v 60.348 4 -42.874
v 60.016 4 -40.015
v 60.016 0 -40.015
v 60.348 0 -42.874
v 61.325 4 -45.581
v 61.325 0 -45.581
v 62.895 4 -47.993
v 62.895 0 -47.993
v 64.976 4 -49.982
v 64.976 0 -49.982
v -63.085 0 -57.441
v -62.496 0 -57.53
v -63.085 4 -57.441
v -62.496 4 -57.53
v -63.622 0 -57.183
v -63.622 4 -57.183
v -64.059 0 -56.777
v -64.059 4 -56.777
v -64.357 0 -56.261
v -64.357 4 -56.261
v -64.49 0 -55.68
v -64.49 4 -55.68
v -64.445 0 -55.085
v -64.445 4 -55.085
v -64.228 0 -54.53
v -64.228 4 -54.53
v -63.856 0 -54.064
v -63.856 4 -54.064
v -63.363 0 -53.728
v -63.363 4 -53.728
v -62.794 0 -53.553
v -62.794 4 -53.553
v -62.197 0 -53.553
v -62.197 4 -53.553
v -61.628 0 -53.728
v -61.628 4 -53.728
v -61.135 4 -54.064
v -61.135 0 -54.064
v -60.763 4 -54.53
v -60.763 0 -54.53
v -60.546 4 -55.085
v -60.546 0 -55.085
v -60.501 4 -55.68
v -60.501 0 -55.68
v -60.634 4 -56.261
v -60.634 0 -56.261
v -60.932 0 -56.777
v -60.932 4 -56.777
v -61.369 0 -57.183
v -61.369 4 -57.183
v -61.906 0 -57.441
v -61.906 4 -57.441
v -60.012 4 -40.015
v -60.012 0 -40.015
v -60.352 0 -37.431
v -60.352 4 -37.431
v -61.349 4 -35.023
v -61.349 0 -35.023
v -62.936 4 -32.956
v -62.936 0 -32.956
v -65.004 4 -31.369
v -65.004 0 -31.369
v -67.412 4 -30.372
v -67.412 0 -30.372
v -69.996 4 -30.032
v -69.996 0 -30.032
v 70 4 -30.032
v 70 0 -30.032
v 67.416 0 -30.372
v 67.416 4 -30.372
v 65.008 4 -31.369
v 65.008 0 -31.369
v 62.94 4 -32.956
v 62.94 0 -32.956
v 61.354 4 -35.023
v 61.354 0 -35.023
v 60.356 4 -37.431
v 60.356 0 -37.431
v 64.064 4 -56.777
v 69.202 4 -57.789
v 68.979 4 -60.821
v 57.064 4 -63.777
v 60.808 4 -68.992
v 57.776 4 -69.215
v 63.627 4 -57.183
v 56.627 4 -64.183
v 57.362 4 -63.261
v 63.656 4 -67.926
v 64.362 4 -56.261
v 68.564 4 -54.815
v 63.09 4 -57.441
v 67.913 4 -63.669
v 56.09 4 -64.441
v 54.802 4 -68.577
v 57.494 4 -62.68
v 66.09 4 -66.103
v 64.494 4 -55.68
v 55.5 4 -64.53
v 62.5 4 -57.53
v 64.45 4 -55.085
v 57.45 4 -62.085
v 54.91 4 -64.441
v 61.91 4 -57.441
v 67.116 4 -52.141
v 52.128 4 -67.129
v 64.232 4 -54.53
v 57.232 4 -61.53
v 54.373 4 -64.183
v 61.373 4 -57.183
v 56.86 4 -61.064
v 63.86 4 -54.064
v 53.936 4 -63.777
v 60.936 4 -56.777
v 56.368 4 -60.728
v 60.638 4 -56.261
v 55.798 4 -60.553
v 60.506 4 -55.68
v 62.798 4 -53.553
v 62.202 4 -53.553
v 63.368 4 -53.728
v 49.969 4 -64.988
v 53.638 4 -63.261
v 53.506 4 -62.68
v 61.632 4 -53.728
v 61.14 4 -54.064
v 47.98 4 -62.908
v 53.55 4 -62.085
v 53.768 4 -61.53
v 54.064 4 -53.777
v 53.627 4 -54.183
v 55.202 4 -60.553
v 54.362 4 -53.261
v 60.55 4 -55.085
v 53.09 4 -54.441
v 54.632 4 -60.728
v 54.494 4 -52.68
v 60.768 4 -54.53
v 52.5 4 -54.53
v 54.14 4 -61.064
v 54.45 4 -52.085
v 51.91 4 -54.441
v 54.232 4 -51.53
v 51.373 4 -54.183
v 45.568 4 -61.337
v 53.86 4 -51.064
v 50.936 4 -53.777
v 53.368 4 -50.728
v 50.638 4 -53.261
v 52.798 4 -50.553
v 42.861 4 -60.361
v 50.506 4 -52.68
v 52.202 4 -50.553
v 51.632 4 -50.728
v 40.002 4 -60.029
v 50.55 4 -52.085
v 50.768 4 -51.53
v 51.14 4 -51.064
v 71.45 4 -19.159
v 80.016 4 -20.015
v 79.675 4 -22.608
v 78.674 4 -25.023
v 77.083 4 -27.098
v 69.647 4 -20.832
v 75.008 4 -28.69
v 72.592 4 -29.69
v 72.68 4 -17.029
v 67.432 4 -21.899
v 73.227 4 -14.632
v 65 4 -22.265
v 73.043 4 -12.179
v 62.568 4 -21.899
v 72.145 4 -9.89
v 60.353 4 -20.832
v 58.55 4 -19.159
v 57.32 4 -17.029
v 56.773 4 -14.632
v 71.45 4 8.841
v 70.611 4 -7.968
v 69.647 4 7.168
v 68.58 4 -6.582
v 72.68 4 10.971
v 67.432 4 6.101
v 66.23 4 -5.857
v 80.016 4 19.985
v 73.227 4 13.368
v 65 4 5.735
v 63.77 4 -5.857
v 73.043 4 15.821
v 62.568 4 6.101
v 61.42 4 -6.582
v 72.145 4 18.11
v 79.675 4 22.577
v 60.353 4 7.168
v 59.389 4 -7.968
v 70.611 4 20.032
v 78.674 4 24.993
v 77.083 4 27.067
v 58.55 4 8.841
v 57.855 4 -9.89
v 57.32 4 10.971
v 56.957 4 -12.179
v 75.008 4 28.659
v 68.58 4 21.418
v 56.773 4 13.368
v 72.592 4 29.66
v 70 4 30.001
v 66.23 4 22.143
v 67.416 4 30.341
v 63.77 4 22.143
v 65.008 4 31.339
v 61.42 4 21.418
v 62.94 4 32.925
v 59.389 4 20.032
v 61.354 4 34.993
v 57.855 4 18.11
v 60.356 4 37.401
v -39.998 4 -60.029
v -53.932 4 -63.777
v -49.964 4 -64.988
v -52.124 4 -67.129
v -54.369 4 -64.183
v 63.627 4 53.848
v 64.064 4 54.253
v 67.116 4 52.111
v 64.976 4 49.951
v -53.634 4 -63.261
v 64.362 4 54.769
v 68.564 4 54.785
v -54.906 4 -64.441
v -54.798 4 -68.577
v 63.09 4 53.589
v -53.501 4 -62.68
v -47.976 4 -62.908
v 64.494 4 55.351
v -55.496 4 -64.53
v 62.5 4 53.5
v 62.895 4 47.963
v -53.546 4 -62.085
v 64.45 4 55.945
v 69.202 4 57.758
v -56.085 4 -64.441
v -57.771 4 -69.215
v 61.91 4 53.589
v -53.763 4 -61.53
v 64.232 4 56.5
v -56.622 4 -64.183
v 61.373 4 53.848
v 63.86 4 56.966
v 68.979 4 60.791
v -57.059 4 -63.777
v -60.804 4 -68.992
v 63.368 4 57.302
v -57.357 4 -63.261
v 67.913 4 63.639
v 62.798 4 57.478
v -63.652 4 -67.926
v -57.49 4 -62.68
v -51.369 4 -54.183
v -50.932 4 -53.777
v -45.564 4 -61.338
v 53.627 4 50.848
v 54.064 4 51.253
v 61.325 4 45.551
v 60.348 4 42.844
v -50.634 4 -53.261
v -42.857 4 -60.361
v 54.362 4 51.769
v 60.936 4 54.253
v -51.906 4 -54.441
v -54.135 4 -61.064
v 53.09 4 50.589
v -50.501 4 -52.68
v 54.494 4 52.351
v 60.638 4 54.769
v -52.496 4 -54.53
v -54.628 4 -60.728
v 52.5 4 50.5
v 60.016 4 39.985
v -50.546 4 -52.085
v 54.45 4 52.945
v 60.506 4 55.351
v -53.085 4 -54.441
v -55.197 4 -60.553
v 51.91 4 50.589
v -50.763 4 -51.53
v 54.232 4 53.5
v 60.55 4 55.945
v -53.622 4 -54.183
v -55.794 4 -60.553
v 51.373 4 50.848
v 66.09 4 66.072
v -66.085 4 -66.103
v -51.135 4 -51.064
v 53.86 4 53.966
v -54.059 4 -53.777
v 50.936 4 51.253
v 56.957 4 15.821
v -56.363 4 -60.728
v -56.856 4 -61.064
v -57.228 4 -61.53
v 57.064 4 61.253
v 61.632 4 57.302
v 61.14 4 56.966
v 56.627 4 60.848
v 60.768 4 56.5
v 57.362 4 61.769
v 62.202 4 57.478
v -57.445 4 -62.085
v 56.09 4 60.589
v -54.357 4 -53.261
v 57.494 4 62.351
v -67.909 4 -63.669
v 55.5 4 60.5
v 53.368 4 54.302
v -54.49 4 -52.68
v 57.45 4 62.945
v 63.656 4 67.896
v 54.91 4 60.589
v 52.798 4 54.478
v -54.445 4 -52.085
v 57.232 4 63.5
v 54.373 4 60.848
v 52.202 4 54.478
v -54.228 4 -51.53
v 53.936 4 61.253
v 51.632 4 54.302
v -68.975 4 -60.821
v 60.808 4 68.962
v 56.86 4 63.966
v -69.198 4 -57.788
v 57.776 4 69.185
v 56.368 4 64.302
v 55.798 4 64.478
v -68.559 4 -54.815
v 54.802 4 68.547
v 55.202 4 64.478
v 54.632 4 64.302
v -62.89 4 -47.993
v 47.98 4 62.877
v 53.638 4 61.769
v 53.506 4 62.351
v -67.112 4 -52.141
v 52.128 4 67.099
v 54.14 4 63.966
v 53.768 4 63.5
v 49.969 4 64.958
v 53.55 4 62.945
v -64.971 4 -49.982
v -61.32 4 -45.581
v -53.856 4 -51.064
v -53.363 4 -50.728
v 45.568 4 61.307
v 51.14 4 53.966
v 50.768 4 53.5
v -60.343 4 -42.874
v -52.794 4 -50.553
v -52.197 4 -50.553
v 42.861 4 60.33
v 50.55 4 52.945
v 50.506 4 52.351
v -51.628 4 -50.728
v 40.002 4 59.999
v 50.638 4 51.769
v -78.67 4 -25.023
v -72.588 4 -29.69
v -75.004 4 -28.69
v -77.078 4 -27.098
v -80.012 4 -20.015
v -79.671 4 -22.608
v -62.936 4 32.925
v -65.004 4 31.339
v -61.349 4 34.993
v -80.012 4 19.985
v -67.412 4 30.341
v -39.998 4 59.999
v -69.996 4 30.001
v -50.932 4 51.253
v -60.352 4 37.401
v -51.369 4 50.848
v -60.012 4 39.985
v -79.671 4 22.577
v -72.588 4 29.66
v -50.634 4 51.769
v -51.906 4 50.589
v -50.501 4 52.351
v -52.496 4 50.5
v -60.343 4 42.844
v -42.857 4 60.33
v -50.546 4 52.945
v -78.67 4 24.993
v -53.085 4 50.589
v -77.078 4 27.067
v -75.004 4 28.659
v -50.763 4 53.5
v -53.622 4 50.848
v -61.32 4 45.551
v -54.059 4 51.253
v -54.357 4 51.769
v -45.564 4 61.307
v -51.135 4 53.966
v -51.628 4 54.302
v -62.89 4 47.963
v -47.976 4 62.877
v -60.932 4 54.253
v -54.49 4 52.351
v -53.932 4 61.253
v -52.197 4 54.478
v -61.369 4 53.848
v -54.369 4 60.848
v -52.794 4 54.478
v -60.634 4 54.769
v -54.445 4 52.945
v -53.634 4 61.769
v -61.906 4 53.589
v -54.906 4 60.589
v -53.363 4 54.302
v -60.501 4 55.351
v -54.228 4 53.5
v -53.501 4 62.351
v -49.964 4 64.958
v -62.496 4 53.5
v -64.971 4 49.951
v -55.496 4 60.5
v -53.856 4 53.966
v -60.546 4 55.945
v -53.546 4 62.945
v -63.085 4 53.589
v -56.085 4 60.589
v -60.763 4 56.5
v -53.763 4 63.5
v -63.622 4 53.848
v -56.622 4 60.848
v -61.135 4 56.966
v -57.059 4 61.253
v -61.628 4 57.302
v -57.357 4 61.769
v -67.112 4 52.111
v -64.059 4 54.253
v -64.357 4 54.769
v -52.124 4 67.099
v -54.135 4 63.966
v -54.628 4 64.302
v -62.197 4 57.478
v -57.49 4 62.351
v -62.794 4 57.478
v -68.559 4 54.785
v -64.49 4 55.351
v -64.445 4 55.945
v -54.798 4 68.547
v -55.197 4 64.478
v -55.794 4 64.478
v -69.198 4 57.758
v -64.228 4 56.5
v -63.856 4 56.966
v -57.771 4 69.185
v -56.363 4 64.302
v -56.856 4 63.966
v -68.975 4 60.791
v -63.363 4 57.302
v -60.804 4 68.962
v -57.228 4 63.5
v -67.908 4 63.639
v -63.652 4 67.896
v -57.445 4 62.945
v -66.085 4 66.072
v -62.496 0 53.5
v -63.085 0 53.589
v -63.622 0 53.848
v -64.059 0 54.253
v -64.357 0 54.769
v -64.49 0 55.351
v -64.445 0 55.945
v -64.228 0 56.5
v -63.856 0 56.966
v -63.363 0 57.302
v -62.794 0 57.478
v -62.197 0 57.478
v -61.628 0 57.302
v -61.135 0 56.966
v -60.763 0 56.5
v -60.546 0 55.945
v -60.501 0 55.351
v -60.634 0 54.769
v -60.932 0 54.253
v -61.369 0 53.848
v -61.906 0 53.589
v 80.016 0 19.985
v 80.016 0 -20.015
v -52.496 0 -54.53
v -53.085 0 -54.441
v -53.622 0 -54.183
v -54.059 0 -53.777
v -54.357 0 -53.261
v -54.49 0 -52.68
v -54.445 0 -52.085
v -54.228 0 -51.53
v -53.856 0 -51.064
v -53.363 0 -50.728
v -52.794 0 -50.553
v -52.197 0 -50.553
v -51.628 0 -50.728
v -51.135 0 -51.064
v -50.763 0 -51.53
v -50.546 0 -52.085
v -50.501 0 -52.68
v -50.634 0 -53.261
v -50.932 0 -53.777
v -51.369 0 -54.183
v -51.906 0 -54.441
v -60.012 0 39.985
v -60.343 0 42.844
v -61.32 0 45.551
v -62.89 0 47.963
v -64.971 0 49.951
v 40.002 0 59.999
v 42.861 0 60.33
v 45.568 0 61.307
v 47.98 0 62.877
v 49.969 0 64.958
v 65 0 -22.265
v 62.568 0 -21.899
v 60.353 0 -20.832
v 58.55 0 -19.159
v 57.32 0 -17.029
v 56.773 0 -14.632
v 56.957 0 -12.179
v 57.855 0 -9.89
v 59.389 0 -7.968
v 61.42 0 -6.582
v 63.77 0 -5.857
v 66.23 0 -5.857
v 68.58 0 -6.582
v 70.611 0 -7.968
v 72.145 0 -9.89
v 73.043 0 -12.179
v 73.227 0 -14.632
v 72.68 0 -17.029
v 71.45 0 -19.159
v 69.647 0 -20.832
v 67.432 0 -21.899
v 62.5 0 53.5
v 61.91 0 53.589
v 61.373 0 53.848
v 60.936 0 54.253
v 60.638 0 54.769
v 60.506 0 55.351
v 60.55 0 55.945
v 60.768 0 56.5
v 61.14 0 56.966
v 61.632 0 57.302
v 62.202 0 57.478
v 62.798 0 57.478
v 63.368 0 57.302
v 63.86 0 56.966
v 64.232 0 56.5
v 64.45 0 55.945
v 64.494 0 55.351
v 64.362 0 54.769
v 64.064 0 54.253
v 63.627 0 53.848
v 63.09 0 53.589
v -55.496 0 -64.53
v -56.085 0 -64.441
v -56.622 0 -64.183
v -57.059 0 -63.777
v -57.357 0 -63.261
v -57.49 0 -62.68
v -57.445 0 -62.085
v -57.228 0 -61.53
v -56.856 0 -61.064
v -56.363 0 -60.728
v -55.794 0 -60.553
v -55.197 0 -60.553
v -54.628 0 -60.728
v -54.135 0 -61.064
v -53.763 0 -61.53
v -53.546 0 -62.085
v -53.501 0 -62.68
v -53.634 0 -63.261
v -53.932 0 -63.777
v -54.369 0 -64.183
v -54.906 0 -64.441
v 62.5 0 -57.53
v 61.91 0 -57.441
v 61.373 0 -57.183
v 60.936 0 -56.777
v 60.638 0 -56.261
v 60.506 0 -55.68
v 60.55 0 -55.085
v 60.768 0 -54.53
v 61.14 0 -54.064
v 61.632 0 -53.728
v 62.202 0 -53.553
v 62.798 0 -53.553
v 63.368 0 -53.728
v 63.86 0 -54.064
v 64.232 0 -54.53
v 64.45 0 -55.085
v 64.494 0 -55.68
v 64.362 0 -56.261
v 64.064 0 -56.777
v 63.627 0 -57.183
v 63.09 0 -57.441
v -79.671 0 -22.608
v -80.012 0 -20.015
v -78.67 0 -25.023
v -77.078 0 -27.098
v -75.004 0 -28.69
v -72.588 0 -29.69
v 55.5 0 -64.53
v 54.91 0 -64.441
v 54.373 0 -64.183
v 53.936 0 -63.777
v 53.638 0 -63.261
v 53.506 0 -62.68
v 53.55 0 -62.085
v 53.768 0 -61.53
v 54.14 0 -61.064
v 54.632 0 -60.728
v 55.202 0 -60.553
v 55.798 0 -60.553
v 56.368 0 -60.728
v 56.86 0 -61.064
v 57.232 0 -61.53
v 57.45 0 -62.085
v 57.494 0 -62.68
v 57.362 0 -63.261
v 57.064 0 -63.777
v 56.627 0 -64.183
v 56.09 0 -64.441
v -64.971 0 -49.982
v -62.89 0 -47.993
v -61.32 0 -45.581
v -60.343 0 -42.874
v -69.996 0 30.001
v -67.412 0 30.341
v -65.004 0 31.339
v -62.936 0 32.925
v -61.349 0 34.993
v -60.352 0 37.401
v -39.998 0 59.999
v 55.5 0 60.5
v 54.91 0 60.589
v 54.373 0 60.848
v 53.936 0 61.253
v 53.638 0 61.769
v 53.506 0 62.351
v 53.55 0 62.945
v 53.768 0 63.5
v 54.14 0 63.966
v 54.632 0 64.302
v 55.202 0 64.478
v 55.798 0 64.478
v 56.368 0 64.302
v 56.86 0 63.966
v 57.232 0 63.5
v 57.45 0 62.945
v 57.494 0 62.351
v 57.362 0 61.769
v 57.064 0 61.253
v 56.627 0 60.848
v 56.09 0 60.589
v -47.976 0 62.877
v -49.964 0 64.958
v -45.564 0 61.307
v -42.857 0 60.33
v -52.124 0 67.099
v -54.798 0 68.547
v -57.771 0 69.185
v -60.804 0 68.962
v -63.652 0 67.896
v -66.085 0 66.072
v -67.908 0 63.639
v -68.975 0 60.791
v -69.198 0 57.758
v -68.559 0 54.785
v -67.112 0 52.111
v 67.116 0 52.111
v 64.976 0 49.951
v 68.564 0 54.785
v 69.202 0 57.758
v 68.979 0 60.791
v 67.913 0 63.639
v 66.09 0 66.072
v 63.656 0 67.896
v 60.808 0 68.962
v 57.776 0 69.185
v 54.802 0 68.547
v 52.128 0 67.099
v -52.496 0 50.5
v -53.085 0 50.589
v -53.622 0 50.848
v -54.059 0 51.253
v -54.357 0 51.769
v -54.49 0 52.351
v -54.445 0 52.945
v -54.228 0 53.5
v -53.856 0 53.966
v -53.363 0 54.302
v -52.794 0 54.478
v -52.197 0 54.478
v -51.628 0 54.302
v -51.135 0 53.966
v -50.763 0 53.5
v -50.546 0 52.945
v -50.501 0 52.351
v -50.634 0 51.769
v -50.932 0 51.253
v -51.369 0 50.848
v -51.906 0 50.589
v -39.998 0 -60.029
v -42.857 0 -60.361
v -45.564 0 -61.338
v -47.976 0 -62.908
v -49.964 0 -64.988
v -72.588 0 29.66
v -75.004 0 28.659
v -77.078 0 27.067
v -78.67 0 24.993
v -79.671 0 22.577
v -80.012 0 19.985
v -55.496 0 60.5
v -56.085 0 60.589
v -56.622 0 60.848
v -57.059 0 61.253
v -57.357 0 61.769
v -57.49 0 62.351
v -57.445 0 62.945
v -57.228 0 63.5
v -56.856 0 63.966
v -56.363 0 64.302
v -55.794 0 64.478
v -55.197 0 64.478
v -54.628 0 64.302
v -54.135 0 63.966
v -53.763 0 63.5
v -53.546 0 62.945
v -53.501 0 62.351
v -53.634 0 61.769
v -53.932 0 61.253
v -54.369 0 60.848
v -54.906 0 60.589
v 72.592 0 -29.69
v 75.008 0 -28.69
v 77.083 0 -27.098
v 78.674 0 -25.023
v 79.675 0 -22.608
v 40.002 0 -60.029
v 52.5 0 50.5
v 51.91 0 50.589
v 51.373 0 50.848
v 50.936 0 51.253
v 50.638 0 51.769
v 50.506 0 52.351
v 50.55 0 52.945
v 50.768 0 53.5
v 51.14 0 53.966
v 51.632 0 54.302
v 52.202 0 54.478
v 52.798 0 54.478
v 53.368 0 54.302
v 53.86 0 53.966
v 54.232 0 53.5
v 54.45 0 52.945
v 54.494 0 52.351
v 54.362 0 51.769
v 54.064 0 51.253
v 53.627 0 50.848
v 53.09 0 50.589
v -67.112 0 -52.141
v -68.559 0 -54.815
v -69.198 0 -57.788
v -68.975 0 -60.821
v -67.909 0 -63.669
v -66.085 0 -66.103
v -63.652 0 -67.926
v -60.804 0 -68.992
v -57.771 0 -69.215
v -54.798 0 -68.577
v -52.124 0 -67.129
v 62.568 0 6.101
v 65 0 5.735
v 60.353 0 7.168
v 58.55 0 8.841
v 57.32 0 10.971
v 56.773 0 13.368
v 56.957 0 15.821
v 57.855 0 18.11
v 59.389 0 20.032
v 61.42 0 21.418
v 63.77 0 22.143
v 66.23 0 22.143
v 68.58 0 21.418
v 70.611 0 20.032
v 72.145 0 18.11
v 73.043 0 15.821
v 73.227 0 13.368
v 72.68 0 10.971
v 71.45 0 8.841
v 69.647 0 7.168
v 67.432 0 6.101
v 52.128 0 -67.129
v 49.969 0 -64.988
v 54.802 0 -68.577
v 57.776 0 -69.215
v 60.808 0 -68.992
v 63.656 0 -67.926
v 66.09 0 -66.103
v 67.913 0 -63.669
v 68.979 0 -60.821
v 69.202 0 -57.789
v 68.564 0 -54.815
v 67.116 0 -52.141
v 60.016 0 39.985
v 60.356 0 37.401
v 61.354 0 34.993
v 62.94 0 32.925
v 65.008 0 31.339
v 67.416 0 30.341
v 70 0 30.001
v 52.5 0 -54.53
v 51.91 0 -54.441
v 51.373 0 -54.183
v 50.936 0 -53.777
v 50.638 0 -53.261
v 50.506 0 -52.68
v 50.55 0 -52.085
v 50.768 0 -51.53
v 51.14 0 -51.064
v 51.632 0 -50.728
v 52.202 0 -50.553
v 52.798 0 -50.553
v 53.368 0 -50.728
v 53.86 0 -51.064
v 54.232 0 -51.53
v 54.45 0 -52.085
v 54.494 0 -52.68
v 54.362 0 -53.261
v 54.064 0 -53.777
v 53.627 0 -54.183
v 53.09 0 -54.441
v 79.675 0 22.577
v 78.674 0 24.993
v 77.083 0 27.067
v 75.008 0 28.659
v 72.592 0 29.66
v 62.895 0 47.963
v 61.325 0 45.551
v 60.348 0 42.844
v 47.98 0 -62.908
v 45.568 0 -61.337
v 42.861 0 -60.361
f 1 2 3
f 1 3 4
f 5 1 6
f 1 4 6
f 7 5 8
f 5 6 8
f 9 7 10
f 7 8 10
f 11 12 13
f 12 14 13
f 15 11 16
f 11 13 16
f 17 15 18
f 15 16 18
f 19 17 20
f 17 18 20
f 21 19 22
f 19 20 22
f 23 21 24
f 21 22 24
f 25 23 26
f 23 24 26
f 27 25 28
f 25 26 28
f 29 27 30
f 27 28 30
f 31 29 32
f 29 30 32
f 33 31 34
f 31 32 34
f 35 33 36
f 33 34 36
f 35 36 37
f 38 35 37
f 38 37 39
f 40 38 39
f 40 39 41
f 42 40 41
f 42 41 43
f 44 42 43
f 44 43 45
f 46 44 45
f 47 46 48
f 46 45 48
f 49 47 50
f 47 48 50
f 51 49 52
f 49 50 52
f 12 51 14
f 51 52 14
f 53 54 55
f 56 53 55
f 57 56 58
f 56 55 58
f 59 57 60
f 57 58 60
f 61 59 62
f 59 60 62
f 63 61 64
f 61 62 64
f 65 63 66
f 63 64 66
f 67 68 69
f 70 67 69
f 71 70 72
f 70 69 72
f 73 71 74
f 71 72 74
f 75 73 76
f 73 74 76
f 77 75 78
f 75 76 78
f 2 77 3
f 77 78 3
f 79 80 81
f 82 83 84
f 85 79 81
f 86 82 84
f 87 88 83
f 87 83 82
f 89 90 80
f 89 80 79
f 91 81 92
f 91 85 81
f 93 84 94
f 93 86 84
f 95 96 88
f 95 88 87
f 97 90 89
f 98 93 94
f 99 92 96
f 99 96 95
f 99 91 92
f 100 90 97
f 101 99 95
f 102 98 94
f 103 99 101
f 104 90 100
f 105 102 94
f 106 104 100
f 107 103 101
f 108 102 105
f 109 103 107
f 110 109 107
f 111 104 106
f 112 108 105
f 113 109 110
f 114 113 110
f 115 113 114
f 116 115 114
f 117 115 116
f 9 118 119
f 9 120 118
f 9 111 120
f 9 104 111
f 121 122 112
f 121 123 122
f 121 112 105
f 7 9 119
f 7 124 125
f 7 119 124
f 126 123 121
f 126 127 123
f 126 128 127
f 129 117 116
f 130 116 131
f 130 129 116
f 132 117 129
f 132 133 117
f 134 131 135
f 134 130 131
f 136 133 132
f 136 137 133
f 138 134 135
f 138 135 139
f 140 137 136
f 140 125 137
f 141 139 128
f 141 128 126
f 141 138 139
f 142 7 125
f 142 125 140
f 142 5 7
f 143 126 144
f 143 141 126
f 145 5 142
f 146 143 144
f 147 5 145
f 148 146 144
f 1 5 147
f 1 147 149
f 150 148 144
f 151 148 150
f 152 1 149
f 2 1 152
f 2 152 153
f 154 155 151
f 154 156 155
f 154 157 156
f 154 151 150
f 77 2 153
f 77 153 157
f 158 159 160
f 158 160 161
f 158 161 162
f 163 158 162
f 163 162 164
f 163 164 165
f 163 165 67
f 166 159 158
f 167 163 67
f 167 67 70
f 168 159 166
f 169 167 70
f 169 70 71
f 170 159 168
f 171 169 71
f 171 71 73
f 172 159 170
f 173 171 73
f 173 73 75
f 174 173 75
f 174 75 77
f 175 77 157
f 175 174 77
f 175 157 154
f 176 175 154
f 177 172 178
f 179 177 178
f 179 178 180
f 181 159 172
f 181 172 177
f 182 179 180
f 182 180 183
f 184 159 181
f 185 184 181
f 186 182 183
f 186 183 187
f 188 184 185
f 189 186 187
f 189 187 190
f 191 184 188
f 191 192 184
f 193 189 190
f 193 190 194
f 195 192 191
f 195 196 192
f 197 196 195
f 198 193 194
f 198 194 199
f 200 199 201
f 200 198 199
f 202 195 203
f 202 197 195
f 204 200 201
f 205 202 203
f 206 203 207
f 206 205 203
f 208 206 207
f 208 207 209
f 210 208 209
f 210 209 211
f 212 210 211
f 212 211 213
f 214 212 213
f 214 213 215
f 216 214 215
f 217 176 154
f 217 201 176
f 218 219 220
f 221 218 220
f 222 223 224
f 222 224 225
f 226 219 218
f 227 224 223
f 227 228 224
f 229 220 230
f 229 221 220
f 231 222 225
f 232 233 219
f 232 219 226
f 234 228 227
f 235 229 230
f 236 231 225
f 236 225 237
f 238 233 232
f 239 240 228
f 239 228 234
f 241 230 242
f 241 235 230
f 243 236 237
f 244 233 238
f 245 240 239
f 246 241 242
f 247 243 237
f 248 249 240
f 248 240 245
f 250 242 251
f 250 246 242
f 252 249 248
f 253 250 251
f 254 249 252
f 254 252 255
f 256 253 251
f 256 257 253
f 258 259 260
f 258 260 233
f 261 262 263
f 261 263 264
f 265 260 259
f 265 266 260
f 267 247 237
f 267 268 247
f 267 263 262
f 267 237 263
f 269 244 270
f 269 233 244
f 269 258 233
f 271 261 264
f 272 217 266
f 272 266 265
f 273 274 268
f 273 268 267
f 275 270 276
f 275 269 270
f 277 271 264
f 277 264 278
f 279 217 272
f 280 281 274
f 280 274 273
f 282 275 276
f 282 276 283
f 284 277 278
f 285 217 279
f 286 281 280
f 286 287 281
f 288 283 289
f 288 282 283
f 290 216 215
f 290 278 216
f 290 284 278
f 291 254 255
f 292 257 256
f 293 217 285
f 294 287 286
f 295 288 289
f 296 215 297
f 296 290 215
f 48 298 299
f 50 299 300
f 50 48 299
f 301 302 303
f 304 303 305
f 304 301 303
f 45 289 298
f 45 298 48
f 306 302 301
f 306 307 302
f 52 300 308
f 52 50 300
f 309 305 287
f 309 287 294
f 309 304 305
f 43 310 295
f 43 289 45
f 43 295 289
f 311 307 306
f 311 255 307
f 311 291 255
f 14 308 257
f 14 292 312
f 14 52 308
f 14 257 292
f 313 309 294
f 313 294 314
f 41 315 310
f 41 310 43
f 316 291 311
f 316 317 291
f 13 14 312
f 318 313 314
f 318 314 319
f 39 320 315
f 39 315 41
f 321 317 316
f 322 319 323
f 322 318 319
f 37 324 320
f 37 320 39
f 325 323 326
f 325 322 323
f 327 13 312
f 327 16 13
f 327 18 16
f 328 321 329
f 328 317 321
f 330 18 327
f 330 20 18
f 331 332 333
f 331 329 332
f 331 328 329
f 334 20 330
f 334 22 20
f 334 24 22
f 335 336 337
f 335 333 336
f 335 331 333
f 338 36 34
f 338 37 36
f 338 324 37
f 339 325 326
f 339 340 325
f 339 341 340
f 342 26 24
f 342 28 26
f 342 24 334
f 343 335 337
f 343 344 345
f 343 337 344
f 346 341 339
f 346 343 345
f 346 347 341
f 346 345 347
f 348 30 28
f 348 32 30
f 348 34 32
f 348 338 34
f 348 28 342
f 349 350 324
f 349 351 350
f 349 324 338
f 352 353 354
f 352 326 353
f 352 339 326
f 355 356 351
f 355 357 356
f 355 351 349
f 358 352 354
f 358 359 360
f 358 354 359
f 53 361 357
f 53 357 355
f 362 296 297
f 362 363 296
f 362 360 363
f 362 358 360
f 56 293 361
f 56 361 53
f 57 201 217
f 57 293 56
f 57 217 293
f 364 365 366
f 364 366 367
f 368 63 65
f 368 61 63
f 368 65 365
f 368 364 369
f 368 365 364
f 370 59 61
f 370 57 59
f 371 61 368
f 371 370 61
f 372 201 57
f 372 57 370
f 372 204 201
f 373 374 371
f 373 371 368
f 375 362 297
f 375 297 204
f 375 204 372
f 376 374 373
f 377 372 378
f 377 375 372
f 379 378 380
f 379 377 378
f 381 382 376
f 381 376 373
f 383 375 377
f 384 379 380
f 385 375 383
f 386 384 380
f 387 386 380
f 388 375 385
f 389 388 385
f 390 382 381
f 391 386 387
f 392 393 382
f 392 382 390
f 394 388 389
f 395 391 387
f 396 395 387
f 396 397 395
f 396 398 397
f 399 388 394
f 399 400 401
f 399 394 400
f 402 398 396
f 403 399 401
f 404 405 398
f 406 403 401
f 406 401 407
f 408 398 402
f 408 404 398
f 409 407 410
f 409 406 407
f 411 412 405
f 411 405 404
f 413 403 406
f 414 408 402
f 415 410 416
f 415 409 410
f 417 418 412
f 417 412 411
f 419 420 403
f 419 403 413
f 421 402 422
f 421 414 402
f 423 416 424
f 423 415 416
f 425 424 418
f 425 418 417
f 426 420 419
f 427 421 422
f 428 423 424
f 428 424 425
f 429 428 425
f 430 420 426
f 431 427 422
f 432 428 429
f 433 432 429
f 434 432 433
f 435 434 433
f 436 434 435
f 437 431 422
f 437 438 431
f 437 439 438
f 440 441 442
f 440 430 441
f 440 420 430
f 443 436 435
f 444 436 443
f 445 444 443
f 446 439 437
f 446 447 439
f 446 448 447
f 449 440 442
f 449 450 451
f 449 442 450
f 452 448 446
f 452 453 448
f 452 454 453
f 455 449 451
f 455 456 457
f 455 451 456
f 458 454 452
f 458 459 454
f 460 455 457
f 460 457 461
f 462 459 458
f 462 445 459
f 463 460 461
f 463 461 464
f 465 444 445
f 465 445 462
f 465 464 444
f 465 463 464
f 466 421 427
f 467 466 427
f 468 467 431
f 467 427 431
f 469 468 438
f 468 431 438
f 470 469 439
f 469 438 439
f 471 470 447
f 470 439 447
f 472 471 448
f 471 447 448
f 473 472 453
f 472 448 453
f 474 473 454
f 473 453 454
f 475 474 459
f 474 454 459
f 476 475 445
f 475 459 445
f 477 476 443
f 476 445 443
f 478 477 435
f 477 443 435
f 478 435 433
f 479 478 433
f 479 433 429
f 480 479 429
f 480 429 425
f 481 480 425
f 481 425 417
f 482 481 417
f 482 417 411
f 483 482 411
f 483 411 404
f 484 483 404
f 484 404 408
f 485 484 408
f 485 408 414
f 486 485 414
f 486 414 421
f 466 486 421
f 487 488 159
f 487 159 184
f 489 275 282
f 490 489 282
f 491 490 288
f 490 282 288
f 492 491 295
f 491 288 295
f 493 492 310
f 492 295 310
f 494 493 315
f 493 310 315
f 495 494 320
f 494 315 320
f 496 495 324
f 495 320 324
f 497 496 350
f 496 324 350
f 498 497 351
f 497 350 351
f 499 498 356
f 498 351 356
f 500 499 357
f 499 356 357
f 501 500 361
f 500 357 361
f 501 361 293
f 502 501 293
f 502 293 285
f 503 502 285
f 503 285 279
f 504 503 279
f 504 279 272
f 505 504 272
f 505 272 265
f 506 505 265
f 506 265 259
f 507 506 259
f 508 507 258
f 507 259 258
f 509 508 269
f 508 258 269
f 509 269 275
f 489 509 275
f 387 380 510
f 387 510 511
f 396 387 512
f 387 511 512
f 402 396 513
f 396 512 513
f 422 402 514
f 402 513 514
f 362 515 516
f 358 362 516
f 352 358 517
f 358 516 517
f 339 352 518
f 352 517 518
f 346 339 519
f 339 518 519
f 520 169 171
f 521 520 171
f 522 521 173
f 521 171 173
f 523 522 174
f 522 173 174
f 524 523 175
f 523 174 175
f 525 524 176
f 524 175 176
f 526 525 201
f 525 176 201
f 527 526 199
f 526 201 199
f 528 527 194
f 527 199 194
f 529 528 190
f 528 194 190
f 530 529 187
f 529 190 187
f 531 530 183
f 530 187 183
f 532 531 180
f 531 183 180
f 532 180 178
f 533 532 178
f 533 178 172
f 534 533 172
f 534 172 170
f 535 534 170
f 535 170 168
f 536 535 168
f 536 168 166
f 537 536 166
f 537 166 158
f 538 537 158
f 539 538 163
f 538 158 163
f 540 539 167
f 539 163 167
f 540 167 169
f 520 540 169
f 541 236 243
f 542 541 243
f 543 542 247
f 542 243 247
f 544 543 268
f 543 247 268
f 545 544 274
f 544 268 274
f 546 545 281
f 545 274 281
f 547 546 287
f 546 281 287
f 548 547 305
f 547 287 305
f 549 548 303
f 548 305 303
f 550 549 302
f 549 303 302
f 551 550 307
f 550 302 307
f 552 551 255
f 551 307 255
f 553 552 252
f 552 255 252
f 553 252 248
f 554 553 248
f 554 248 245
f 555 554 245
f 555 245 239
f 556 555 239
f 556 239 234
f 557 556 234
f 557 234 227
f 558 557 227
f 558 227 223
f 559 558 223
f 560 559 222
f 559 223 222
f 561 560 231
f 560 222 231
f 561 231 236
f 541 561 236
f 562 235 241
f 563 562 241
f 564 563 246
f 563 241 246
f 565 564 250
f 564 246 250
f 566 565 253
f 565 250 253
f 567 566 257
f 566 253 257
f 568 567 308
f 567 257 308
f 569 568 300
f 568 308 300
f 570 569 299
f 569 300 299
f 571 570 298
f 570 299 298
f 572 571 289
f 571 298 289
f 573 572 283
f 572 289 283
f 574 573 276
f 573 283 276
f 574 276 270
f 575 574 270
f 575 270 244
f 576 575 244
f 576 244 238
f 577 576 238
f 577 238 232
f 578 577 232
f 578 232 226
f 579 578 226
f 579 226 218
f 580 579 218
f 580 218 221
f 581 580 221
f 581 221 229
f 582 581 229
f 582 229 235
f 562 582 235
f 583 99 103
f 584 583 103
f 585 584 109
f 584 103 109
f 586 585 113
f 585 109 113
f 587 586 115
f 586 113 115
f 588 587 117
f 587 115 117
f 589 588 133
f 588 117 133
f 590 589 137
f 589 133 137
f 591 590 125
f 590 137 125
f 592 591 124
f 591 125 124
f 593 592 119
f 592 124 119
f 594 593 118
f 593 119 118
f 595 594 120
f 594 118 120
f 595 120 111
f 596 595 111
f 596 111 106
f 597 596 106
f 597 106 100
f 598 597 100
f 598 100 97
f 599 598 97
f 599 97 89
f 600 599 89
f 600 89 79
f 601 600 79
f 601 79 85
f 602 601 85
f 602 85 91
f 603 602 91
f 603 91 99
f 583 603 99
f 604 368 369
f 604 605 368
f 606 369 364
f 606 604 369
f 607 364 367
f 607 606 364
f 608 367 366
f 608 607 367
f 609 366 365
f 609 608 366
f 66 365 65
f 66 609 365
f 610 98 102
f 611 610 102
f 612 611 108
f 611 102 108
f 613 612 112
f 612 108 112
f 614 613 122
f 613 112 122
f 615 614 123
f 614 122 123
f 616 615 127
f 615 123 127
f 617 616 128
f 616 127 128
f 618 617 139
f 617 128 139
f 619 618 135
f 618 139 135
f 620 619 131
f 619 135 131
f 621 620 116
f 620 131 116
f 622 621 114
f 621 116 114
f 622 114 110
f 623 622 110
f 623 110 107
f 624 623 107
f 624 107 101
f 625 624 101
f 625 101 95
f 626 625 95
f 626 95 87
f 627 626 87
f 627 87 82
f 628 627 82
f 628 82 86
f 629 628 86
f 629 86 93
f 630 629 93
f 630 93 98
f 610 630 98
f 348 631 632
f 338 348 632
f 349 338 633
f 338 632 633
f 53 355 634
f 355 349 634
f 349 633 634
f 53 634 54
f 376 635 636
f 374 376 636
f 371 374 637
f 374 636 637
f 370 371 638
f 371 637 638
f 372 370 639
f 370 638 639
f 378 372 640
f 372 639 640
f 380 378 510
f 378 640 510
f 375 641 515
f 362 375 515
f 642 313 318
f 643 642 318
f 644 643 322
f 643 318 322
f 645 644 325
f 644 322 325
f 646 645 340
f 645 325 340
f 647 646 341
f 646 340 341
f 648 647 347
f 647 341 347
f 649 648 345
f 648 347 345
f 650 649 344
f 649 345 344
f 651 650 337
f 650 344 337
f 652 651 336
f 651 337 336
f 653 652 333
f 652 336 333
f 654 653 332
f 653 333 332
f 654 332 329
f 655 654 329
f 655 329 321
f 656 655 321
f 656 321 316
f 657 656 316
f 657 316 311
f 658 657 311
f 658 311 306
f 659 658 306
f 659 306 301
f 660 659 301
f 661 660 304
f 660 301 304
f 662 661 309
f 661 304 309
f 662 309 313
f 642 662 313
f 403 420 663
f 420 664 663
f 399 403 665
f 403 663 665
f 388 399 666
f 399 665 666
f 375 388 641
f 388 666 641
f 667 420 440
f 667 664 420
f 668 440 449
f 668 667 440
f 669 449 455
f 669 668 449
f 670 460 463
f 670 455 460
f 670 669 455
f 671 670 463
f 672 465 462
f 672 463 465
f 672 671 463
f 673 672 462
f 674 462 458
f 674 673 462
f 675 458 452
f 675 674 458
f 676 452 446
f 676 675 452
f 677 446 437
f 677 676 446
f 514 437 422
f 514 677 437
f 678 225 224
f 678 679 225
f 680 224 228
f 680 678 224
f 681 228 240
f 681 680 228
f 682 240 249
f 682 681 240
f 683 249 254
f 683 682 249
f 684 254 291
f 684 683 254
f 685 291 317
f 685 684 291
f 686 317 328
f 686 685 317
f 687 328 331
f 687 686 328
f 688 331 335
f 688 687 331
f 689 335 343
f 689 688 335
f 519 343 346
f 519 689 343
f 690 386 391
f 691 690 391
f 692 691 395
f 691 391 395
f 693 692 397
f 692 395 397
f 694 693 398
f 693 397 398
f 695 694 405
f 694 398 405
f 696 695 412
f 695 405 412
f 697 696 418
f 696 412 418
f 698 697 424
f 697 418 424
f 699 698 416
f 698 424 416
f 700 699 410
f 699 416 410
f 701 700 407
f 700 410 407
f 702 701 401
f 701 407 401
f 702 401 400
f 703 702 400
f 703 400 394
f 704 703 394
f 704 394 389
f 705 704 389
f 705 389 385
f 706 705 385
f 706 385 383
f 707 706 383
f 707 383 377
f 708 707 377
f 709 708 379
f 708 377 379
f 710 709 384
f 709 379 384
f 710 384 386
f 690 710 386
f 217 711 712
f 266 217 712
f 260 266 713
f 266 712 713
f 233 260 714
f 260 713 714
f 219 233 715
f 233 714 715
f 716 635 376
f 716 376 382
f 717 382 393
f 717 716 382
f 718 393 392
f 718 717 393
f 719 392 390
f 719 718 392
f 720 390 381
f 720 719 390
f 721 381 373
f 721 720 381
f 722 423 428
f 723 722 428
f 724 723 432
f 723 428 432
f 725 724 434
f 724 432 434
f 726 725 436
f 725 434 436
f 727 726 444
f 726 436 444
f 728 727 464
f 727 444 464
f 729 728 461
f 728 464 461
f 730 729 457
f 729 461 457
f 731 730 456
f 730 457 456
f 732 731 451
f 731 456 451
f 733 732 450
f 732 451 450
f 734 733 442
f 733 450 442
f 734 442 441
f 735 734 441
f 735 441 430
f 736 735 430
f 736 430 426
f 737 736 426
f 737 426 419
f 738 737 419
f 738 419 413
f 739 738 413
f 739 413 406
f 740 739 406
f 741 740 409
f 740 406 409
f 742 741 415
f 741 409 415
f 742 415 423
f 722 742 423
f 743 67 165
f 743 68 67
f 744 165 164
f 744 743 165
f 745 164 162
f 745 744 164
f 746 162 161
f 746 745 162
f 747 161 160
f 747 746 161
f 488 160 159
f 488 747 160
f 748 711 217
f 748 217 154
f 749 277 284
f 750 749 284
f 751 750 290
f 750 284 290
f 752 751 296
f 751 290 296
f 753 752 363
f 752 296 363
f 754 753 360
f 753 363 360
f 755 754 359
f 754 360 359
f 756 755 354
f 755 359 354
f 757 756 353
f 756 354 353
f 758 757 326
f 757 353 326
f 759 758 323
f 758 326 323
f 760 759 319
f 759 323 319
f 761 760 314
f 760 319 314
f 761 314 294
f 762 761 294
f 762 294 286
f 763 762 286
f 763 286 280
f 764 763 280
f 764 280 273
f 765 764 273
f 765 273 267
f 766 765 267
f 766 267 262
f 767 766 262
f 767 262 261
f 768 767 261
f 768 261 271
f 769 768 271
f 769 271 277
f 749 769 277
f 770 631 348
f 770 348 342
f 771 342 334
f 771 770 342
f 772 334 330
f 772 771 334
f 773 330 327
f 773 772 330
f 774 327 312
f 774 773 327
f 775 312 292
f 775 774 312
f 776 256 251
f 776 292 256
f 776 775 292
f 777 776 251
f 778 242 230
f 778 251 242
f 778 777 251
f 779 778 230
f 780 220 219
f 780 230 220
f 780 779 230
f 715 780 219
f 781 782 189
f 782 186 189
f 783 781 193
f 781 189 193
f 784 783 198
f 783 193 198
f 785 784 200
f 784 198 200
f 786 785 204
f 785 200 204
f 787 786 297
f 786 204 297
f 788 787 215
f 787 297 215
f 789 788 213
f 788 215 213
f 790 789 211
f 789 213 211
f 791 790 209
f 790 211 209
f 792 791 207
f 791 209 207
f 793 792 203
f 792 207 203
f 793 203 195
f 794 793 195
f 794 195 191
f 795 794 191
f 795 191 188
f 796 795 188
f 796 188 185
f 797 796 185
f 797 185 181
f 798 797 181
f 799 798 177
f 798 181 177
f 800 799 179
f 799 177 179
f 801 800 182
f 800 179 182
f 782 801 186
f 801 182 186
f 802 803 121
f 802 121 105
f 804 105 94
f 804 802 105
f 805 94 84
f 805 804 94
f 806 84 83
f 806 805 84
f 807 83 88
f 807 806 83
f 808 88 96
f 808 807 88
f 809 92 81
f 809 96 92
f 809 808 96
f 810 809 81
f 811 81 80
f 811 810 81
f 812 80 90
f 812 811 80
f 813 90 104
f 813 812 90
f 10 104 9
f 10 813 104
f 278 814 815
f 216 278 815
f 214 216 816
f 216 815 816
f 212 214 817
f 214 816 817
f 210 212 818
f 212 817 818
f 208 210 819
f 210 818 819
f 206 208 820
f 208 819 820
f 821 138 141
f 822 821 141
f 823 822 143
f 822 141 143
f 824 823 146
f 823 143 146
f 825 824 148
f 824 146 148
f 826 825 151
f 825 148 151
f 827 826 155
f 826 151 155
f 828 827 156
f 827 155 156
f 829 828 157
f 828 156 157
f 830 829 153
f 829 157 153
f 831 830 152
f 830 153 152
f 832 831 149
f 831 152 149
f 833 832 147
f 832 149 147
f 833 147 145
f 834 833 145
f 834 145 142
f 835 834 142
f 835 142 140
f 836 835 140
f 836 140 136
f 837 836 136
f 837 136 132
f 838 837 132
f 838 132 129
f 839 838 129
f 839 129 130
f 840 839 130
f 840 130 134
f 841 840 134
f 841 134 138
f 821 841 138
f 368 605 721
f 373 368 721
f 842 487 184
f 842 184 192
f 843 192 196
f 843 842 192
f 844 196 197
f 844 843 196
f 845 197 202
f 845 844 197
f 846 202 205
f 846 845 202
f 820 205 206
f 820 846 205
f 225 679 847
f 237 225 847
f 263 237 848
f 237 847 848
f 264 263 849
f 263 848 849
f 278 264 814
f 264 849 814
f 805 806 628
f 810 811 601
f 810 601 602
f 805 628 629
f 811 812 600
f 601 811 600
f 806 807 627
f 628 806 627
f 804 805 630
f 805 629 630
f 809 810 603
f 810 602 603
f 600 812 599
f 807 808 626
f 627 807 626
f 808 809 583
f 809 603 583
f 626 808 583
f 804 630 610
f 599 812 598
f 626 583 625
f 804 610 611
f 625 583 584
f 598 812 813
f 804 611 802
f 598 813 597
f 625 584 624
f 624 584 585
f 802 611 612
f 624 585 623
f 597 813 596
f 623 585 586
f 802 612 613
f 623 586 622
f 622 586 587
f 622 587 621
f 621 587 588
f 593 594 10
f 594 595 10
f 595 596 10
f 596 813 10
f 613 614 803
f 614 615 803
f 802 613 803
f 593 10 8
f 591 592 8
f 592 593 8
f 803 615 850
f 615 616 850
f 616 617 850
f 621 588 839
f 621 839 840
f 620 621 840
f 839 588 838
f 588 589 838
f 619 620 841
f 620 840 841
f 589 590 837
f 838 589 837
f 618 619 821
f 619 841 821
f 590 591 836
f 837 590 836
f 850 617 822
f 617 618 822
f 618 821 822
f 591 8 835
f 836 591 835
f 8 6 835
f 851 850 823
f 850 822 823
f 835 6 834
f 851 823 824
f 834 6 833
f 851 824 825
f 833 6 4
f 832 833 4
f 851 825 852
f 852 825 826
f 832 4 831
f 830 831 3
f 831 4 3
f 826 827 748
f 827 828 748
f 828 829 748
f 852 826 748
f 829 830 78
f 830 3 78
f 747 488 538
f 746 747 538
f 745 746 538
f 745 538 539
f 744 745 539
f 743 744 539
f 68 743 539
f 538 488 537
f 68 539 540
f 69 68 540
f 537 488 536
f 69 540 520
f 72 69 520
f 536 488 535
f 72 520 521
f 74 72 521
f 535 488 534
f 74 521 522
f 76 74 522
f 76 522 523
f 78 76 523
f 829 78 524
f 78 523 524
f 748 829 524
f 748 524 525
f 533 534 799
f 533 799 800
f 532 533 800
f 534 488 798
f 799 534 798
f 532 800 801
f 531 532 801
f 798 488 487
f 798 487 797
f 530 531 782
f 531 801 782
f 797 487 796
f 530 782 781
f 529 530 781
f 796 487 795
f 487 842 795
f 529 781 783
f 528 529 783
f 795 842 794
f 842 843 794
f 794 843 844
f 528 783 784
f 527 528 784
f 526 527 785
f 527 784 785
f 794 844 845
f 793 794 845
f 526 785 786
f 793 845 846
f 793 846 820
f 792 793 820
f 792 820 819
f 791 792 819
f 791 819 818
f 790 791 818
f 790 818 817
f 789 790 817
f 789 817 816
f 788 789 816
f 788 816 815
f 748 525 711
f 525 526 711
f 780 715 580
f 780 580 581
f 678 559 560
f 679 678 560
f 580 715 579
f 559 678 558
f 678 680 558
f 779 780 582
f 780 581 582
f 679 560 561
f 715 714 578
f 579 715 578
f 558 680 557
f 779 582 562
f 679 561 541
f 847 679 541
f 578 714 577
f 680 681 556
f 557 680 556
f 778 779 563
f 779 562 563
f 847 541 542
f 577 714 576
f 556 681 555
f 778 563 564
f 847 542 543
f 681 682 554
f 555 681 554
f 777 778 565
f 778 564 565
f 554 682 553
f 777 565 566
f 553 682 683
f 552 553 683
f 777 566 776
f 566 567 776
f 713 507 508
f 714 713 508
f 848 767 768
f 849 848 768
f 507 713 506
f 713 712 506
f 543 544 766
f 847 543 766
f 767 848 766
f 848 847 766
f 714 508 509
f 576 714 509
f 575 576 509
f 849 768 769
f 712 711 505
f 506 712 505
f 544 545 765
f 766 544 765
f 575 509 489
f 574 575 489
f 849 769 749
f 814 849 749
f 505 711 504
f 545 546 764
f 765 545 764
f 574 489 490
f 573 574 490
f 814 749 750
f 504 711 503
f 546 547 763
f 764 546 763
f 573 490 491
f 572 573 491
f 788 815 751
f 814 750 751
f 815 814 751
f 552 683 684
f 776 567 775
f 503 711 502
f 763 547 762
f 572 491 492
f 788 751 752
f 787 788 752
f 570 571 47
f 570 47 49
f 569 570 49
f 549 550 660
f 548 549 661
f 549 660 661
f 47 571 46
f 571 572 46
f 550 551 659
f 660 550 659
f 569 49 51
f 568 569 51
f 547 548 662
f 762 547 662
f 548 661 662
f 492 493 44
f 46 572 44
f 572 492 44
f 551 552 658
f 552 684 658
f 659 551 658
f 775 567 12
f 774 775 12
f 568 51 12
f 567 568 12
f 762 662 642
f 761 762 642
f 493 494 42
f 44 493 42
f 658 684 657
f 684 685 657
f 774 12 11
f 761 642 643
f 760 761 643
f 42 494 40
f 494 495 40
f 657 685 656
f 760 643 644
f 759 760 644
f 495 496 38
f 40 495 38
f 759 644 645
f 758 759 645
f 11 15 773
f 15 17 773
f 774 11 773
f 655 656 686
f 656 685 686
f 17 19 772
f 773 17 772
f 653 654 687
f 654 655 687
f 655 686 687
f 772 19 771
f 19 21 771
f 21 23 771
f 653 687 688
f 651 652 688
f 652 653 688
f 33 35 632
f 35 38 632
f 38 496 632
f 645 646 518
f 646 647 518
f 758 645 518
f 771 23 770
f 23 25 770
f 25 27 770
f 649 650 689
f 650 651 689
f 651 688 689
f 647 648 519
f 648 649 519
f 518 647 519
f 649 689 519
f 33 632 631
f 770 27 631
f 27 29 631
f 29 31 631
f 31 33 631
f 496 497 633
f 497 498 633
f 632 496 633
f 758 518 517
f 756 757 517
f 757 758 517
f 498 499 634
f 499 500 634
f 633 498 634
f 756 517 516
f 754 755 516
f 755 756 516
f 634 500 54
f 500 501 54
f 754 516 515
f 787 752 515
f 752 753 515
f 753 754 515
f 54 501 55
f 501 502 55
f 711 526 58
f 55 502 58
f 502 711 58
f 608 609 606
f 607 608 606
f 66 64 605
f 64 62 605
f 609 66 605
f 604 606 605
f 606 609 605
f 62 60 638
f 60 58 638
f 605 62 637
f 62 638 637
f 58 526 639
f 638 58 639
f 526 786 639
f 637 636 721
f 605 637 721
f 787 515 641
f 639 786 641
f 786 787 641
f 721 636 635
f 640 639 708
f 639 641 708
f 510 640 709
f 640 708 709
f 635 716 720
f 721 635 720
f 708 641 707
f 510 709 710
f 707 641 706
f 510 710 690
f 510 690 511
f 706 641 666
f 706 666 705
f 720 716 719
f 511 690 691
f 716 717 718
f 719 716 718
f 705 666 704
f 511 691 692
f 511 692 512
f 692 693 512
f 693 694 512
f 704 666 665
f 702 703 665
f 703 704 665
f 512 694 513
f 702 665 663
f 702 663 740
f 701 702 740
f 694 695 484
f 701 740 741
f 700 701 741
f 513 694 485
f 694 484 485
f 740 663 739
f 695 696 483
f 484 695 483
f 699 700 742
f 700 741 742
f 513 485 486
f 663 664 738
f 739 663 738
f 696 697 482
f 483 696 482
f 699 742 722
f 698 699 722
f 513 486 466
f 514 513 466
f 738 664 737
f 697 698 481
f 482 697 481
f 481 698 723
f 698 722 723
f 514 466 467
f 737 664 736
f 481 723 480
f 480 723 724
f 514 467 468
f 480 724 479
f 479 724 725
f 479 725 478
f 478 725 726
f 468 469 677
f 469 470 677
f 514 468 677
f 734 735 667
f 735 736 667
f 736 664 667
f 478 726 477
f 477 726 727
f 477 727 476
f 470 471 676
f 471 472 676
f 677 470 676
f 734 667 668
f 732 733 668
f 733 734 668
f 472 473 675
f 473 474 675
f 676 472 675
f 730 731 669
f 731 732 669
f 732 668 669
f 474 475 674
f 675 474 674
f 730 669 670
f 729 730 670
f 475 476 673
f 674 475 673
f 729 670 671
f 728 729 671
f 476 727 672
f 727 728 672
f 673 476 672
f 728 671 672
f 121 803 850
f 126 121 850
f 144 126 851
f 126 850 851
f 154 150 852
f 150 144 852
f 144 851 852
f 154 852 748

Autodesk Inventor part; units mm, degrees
ref_plane "YZ Plane" through (0, 0, 0) normal (1, 0, 0) x (0, 1, 0)
ref_plane "XZ Plane" through (0, 0, 0) normal (0, 1, 0) x (-1, 0, 0)
ref_plane "XY Plane" through (0, 0, 0) normal (0, 0, 1) x (1, 0, 0)
sketch "Sketch1" plane through (0, 0, 0) normal (0, 1, 0) x (-1, 0, 0)
  line L0 (-0.0023, 59.9989) -> (-40.0023, 59.9989)
  line L1 (-0.0023, 59.9989) -> (39.9977, 59.9989) construction
  line L2 (-60.0163, -0.0152) -> (-60.0163, 39.9848)
  line L3 (-60.0163, -0.0152) -> (-20.0163, -0.0152) construction
  line L4 (-60.0163, -0.0152) -> (-0.0023, -0.0152)
  line L5 (-0.0023, -0.0152) -> (-0.0023, 59.9989)
  arc A0 (-49.9687, 64.958) -> (-40.0023, 59.9989) centre (-40.0023, 72.4933) ccw
  arc A1 (-60.0163, 39.9848) -> (-64.9755, 49.9513) centre (-72.5108, 39.9848) ccw
  arc A2 (-49.9687, 64.958) -> (-64.9755, 49.9513) centre (-58.5144, 58.4969) ccw
  line L6 (-40.0023, 59.9989) -> (-40.0023, 59.4989)
  line L7 (-60.0163, 39.9848) -> (-59.5163, 39.9848)
  arc A3 (-59.5163, 39.9848) -> (-40.0023, 59.4989) centre (-59.5163, 59.4989) ccw
  line L8 (-60.0163, -0.0152) -> (-80.0163, -0.0152)
  line L9 (-80.0163, -0.0152) -> (-80.0163, 19.9848)
  arc A4 (-70, 30.0011) -> (-60.0163, 39.9848) centre (-70, 39.9848) ccw
  arc A5 (-70, 30.0011) -> (-80.0163, 19.9848) centre (-70, 19.9848) ccw
  line L10 (-60.0163, -40.0152) -> (-59.5163, -40.0152)
  arc A6 (-64.9755, -49.9816) -> (-60.0163, -40.0152) centre (-72.5108, -40.0152) ccw
  line L11 (-60.0163, -0.0152) -> (-60.0163, -40.0152)
  arc A7 (-64.9755, -49.9816) -> (-49.9687, -64.9884) centre (-58.5144, -58.5273) ccw
  arc A8 (-40.0023, -60.0292) -> (-49.9687, -64.9884) centre (-40.0023, -72.5237) ccw
  arc A9 (-40.0023, -59.5292) -> (-59.5163, -40.0152) centre (-59.5163, -59.5292) ccw
  line L12 (-40.0023, -60.0292) -> (-40.0023, -59.5292)
  line L13 (-0.0023, -60.0292) -> (-40.0023, -60.0292)
  line L14 (-0.0023, -0.0152) -> (-0.0023, -60.0292)
  arc A10 (-60.0163, -40.0152) -> (-70, -30.0315) centre (-70, -40.0152) ccw
  line L15 (-80.0163, -0.0152) -> (-80.0163, -20.0152)
  arc A11 (-80.0163, -20.0152) -> (-70, -30.0315) centre (-70, -20.0152) ccw
  arc A12 (80.0118, 19.9848) -> (69.9955, 30.0011) centre (69.9955, 19.9848) ccw
  line L16 (60.0118, -0.0152) -> (80.0118, -0.0152)
  line L17 (80.0118, -0.0152) -> (80.0118, 19.9848)
  line L18 (-0.0023, 59.9989) -> (-40.0023, 59.9989) construction
  line L19 (-0.0023, 59.9989) -> (39.9977, 59.9989)
  line L20 (60.0118, -0.0152) -> (60.0118, 39.9848)
  arc A13 (60.0118, 39.9848) -> (69.9955, 30.0011) centre (69.9955, 39.9848) ccw
  line L21 (60.0118, 39.9848) -> (59.5118, 39.9848)
  arc A14 (64.9709, 49.9513) -> (60.0118, 39.9848) centre (72.5063, 39.9848) ccw
  line L22 (60.0118, -0.0152) -> (20.0118, -0.0152) construction
  arc A15 (64.9709, 49.9513) -> (49.9642, 64.958) centre (58.5098, 58.4969) ccw
  arc A16 (39.9977, 59.4989) -> (59.5118, 39.9848) centre (59.5118, 59.4989) ccw
  line L23 (39.9977, 59.9989) -> (39.9977, 59.4989)
  arc A17 (39.9977, 59.9989) -> (49.9642, 64.958) centre (39.9977, 72.4933) ccw
  line L24 (60.0118, -0.0152) -> (-0.0023, -0.0152)
  line L25 (80.0118, -0.0152) -> (80.0118, -20.0152)
  arc A18 (69.9955, -30.0315) -> (80.0118, -20.0152) centre (69.9955, -20.0152) ccw
  arc A19 (69.9955, -30.0315) -> (60.0118, -40.0152) centre (69.9955, -40.0152) ccw
  line L26 (60.0118, -40.0152) -> (59.5118, -40.0152)
  line L27 (60.0118, -0.0152) -> (60.0118, -40.0152)
  arc A20 (60.0118, -40.0152) -> (64.9709, -49.9816) centre (72.5063, -40.0152) ccw
  arc A21 (59.5118, -40.0152) -> (39.9977, -59.5292) centre (59.5118, -59.5292) ccw
  arc A22 (49.9642, -64.9884) -> (64.9709, -49.9816) centre (58.5098, -58.5273) ccw
  line L28 (39.9977, -60.0292) -> (39.9977, -59.5292)
  arc A23 (49.9642, -64.9884) -> (39.9977, -60.0292) centre (39.9977, -72.5237) ccw
  line L29 (-0.0023, -60.0292) -> (39.9977, -60.0292)
  point P0 (0, 0)
  point P1 (-55.5, 62.5)
  point P2 (-62.5, 55.5)
  point P3 (-52.5, 52.5)
  point P4 (-52.5, -52.5303)
  point P5 (-62.5, -55.5303)
  point P6 (-55.5, -62.5303)
  point P7 (55.4955, -62.5303)
  point P8 (62.4955, -55.5303)
  point P9 (52.4955, -52.5303)
  point P10 (52.4955, 52.5)
  point P11 (62.4955, 55.5)
  point P12 (55.4955, 62.5)
  point P13 (-65, 13.9848)
  point P14 (-65, -14.0152)
  dimension "d0" = 40
  dimension "d1" = 180
  dimension "d2" = 40
  dimension "d3" = 90
  dimension "d4" = 12.4944
  dimension "d5" = 12.4944
  dimension "d6" = 0.5
  dimension "d7" = 0.5
  dimension "d8" = 20
  dimension "d9" = 20
  dimension "d42" = 14
  dimension "d43" = 14
extrude "Extrusion1" add sketch "Sketch1" along normal blind 4 contours L5 L4 L2 L7 A3 L6 L0 | L19 L23 A16 L21 L20 L24 L5 | L14 L13 L12 A9 L10 L11 L4 | L24 L27 L26 A21 L28 L29 L14 | L8 L9 A5 A4 L2 | L11 A10 A11 L15 L8 | L20 A13 A12 L17 L16 | L16 L25 A18 A19 L27
extrude "Extrusion2" add sketch "Sketch1" along normal blind 4 contours L6 A3 L7 A1 A2 A0 | A17 A15 A14 L21 A16 L23 | L10 A9 L12 A8 A7 A6 | L28 A21 L26 A20 A22 A23
hole "Hole1" at (65, 0, -14.0152) direction (0, 1, 0) diameter 16.5 end through all
hole "Hole2" at (65, 0, 13.9848) direction (0, 1, 0) diameter 16.5 end through all
hole "Hole3" at (-55.4955, 0, 62.5) at (-62.4955, 0, 55.5) at (-52.4955, 0, 52.5) at (-52.4955, 0, -52.5303) at (-62.4955, 0, -55.5303) at (-55.4955, 0, -62.5303) at (55.5, 0, -62.5303) at (62.5, 0, -55.5303) at (52.5, 0, -52.5303) at (52.5, 0, 52.5) at (62.5, 0, 55.5) at (55.5, 0, 62.5) at (65, 0, 13.9848) at (65, 0, -14.0152) direction (0, 1, 0) diameter 4 end through all
properties part number "LowerPlatter" material "ABS Plastic"
